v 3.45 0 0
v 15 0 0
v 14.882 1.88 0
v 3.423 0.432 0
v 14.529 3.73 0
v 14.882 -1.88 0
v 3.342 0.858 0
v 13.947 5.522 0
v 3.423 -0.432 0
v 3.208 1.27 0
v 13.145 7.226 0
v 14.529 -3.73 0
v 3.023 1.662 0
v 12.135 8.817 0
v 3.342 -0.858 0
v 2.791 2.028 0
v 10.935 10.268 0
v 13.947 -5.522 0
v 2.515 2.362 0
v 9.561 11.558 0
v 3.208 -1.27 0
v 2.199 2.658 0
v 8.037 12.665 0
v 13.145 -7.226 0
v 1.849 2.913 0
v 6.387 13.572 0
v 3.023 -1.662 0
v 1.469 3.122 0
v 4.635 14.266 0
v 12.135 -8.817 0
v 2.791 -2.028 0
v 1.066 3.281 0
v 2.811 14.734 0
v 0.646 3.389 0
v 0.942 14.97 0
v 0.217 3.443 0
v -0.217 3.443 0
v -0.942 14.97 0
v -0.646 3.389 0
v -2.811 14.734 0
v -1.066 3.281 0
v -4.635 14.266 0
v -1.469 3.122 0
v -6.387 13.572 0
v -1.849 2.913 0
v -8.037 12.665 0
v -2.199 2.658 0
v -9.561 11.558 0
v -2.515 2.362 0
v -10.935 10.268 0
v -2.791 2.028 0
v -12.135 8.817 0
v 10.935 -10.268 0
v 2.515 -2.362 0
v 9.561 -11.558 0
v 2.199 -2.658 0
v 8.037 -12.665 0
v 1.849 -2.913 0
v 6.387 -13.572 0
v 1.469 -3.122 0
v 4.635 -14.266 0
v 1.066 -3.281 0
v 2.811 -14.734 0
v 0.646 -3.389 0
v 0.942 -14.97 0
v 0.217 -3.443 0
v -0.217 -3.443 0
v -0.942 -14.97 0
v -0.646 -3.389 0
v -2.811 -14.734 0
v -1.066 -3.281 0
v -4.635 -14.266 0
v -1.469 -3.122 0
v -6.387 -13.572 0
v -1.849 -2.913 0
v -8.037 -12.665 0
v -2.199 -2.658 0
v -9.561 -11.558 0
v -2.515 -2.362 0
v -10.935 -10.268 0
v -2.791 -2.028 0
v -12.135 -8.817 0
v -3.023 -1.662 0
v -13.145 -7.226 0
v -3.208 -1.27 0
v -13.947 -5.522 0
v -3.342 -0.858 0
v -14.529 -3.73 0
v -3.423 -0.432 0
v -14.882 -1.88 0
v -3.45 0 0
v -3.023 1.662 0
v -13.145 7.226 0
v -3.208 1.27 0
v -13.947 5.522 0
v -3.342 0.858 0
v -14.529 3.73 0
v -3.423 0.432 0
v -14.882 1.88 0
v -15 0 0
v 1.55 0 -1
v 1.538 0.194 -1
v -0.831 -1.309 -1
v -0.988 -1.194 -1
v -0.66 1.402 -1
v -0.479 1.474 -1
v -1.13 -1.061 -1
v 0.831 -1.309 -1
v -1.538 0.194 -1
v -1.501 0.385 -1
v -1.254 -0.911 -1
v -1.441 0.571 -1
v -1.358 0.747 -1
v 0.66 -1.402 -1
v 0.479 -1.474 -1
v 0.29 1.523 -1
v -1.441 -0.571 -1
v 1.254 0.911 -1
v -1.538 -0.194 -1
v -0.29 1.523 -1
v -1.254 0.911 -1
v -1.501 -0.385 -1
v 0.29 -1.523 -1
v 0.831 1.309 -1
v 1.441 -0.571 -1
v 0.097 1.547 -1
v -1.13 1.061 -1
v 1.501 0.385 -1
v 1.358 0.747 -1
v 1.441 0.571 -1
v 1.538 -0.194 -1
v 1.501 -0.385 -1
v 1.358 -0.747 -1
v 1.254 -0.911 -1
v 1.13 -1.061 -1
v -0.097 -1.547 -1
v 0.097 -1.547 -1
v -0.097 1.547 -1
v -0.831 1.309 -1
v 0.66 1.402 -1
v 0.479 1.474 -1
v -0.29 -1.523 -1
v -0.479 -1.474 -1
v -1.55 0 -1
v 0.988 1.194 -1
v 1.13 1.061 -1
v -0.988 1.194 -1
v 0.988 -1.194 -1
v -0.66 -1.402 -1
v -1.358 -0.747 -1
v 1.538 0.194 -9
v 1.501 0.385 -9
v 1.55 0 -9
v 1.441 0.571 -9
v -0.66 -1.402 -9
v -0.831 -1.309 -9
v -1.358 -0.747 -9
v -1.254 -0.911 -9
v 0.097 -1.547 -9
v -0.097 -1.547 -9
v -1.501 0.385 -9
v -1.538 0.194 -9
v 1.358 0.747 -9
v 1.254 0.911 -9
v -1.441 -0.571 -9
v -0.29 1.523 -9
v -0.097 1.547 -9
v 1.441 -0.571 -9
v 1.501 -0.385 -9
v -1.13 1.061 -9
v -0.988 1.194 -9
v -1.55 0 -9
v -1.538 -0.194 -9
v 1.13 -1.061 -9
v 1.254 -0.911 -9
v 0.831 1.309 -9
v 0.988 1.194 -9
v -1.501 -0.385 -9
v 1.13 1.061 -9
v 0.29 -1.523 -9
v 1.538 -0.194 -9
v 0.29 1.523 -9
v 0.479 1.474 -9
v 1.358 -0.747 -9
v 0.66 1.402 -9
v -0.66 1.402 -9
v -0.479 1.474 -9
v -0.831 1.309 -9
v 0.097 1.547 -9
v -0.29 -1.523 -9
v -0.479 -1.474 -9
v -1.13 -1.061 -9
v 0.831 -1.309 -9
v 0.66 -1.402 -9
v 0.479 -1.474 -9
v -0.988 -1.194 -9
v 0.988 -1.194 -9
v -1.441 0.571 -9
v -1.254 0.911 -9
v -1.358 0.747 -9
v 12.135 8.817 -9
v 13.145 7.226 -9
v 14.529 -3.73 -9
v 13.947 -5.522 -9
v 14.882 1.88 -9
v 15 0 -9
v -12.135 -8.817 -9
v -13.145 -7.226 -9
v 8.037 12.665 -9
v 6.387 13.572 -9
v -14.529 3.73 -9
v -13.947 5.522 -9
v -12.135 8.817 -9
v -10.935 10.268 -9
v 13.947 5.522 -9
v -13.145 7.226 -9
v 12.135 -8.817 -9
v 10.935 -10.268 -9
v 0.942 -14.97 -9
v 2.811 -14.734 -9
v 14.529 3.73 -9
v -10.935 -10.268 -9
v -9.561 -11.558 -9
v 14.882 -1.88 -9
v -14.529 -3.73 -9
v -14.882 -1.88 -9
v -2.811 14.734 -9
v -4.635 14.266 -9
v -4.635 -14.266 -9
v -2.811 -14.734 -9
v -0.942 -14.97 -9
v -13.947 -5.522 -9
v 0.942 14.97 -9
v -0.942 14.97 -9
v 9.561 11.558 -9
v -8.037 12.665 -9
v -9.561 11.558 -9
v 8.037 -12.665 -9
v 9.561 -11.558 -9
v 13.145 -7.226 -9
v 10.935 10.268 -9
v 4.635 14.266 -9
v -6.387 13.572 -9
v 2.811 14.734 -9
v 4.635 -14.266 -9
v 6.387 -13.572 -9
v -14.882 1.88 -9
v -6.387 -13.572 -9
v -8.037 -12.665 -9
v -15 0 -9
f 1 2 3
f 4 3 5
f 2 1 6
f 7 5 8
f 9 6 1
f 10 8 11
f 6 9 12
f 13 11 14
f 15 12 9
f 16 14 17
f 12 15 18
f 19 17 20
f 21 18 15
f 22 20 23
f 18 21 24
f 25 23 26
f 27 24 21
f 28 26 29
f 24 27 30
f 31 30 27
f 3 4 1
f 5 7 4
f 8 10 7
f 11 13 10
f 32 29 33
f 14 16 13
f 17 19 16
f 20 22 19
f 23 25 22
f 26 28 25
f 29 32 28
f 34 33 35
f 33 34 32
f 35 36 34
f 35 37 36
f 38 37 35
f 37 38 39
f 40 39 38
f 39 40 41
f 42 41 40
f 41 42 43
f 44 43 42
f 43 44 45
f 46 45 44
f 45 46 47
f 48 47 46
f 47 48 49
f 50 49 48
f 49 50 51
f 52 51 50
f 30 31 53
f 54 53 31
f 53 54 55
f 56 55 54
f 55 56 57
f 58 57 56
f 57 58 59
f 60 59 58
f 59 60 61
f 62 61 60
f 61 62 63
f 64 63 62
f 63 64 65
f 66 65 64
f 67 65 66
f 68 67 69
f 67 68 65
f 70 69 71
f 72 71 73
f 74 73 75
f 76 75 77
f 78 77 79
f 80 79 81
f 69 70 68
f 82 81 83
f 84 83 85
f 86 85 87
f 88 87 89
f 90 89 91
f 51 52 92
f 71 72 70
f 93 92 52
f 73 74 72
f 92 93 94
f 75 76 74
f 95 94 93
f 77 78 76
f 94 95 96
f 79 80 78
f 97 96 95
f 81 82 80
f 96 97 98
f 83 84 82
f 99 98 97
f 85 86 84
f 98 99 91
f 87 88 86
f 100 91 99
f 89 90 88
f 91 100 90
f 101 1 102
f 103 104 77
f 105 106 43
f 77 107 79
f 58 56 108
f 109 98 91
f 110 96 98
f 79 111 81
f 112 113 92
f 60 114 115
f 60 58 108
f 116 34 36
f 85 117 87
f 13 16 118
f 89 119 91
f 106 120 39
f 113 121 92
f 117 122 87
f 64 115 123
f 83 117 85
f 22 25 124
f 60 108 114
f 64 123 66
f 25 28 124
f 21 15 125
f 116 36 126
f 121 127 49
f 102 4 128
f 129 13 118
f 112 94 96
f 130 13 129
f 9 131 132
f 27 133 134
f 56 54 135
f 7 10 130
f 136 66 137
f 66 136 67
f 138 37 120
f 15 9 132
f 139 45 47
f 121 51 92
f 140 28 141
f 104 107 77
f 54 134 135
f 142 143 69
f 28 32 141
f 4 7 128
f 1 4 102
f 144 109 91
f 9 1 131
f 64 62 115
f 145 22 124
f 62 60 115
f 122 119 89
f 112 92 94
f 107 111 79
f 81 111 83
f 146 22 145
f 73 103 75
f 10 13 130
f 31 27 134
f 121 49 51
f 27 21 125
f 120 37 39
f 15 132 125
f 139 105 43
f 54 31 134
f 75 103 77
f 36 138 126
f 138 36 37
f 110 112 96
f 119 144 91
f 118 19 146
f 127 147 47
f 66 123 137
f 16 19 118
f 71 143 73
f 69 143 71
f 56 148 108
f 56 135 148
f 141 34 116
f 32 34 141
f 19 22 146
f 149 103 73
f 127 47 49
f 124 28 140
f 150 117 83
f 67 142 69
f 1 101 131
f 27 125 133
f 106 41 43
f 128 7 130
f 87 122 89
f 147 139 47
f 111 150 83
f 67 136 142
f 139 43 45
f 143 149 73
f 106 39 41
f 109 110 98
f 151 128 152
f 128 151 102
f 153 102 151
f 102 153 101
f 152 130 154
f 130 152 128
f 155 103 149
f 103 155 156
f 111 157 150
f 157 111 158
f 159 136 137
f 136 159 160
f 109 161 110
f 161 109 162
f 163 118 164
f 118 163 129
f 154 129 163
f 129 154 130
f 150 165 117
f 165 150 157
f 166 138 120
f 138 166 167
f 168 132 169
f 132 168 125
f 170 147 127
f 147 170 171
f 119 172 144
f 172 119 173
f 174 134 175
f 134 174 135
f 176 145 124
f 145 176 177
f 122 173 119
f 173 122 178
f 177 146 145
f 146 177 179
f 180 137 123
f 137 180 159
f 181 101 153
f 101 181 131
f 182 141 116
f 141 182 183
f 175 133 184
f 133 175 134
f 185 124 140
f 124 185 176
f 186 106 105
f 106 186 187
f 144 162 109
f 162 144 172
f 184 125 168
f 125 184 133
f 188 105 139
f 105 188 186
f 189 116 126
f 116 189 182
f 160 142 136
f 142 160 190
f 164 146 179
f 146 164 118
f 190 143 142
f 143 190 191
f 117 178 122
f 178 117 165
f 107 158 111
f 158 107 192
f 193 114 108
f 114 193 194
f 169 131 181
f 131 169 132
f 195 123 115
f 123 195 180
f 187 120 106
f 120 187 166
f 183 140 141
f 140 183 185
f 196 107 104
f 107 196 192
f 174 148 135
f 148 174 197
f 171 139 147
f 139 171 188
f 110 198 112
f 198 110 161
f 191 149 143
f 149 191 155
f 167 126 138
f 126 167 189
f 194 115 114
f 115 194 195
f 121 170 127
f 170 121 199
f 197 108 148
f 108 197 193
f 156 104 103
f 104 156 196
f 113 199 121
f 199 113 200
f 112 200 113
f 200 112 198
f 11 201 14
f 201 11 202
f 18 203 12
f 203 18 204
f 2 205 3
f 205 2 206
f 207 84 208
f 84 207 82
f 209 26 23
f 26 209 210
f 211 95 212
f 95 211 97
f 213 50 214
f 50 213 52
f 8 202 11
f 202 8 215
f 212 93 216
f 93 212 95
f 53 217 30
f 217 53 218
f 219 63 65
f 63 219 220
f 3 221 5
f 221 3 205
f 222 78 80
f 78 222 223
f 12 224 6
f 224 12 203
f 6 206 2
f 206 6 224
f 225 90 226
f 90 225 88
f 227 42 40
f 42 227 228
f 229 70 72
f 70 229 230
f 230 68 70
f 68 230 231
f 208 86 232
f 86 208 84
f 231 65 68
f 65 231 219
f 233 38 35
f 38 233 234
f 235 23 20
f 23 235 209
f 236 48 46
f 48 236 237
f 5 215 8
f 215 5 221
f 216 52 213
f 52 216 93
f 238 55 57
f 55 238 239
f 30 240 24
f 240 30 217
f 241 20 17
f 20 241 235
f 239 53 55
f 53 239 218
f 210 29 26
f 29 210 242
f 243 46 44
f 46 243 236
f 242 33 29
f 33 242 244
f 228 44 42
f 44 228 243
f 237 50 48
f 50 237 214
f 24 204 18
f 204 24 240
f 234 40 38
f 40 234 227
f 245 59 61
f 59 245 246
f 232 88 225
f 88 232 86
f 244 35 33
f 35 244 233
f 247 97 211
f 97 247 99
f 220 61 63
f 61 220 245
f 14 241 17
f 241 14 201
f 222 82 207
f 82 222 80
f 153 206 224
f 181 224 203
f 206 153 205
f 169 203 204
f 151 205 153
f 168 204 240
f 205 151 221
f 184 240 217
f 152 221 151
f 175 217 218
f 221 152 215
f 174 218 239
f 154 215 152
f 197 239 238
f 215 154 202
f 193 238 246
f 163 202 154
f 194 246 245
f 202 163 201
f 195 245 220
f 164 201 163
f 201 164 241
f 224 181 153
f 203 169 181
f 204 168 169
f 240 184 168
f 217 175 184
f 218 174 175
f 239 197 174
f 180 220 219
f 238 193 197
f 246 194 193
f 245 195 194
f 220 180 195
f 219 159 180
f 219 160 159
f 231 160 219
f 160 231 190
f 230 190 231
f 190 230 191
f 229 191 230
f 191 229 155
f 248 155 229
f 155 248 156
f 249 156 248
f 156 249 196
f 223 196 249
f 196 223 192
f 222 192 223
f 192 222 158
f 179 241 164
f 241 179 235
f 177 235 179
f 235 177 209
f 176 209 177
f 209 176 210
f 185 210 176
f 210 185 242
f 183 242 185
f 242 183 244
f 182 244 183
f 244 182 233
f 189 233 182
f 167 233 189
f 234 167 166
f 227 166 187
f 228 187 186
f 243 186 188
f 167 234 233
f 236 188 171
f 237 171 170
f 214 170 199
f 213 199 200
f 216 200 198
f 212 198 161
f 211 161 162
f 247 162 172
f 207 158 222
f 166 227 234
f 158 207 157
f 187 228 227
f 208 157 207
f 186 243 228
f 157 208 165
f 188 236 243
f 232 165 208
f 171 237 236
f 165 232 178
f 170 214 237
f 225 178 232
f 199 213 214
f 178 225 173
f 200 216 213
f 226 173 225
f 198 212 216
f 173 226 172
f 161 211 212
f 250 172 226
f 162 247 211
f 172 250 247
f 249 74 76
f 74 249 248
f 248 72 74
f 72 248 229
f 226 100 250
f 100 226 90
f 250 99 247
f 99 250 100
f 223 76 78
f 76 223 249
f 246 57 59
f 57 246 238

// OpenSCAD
$fn = 50;

difference() {
	union() {
		translate(v = [0, 0, -9.0]) {
			cylinder(h = 9, r = 15.0);
		}
	}
	union() {
		translate(v = [0, 0, 0]) {
			rotate(a = [0, 0, 0]) {
				difference() {
					union() {
						translate(v = [0, 0, -12.0]) {
							cylinder(h = 12, r = 1.25);
						}
						translate(v = [0, 0, -1.0]) {
							cylinder(h = 1.0, r1 = 1.55, r2 = 3.45);
						}
						translate(v = [0, 0, -12.0]) {
							cylinder(h = 12, r = 1.55);
						}
						translate(v = [0, 0, -12.0]) {
							cylinder(h = 12, r = 1.25);
						}
					}
					union();
				}
			}
		}
	}
}
